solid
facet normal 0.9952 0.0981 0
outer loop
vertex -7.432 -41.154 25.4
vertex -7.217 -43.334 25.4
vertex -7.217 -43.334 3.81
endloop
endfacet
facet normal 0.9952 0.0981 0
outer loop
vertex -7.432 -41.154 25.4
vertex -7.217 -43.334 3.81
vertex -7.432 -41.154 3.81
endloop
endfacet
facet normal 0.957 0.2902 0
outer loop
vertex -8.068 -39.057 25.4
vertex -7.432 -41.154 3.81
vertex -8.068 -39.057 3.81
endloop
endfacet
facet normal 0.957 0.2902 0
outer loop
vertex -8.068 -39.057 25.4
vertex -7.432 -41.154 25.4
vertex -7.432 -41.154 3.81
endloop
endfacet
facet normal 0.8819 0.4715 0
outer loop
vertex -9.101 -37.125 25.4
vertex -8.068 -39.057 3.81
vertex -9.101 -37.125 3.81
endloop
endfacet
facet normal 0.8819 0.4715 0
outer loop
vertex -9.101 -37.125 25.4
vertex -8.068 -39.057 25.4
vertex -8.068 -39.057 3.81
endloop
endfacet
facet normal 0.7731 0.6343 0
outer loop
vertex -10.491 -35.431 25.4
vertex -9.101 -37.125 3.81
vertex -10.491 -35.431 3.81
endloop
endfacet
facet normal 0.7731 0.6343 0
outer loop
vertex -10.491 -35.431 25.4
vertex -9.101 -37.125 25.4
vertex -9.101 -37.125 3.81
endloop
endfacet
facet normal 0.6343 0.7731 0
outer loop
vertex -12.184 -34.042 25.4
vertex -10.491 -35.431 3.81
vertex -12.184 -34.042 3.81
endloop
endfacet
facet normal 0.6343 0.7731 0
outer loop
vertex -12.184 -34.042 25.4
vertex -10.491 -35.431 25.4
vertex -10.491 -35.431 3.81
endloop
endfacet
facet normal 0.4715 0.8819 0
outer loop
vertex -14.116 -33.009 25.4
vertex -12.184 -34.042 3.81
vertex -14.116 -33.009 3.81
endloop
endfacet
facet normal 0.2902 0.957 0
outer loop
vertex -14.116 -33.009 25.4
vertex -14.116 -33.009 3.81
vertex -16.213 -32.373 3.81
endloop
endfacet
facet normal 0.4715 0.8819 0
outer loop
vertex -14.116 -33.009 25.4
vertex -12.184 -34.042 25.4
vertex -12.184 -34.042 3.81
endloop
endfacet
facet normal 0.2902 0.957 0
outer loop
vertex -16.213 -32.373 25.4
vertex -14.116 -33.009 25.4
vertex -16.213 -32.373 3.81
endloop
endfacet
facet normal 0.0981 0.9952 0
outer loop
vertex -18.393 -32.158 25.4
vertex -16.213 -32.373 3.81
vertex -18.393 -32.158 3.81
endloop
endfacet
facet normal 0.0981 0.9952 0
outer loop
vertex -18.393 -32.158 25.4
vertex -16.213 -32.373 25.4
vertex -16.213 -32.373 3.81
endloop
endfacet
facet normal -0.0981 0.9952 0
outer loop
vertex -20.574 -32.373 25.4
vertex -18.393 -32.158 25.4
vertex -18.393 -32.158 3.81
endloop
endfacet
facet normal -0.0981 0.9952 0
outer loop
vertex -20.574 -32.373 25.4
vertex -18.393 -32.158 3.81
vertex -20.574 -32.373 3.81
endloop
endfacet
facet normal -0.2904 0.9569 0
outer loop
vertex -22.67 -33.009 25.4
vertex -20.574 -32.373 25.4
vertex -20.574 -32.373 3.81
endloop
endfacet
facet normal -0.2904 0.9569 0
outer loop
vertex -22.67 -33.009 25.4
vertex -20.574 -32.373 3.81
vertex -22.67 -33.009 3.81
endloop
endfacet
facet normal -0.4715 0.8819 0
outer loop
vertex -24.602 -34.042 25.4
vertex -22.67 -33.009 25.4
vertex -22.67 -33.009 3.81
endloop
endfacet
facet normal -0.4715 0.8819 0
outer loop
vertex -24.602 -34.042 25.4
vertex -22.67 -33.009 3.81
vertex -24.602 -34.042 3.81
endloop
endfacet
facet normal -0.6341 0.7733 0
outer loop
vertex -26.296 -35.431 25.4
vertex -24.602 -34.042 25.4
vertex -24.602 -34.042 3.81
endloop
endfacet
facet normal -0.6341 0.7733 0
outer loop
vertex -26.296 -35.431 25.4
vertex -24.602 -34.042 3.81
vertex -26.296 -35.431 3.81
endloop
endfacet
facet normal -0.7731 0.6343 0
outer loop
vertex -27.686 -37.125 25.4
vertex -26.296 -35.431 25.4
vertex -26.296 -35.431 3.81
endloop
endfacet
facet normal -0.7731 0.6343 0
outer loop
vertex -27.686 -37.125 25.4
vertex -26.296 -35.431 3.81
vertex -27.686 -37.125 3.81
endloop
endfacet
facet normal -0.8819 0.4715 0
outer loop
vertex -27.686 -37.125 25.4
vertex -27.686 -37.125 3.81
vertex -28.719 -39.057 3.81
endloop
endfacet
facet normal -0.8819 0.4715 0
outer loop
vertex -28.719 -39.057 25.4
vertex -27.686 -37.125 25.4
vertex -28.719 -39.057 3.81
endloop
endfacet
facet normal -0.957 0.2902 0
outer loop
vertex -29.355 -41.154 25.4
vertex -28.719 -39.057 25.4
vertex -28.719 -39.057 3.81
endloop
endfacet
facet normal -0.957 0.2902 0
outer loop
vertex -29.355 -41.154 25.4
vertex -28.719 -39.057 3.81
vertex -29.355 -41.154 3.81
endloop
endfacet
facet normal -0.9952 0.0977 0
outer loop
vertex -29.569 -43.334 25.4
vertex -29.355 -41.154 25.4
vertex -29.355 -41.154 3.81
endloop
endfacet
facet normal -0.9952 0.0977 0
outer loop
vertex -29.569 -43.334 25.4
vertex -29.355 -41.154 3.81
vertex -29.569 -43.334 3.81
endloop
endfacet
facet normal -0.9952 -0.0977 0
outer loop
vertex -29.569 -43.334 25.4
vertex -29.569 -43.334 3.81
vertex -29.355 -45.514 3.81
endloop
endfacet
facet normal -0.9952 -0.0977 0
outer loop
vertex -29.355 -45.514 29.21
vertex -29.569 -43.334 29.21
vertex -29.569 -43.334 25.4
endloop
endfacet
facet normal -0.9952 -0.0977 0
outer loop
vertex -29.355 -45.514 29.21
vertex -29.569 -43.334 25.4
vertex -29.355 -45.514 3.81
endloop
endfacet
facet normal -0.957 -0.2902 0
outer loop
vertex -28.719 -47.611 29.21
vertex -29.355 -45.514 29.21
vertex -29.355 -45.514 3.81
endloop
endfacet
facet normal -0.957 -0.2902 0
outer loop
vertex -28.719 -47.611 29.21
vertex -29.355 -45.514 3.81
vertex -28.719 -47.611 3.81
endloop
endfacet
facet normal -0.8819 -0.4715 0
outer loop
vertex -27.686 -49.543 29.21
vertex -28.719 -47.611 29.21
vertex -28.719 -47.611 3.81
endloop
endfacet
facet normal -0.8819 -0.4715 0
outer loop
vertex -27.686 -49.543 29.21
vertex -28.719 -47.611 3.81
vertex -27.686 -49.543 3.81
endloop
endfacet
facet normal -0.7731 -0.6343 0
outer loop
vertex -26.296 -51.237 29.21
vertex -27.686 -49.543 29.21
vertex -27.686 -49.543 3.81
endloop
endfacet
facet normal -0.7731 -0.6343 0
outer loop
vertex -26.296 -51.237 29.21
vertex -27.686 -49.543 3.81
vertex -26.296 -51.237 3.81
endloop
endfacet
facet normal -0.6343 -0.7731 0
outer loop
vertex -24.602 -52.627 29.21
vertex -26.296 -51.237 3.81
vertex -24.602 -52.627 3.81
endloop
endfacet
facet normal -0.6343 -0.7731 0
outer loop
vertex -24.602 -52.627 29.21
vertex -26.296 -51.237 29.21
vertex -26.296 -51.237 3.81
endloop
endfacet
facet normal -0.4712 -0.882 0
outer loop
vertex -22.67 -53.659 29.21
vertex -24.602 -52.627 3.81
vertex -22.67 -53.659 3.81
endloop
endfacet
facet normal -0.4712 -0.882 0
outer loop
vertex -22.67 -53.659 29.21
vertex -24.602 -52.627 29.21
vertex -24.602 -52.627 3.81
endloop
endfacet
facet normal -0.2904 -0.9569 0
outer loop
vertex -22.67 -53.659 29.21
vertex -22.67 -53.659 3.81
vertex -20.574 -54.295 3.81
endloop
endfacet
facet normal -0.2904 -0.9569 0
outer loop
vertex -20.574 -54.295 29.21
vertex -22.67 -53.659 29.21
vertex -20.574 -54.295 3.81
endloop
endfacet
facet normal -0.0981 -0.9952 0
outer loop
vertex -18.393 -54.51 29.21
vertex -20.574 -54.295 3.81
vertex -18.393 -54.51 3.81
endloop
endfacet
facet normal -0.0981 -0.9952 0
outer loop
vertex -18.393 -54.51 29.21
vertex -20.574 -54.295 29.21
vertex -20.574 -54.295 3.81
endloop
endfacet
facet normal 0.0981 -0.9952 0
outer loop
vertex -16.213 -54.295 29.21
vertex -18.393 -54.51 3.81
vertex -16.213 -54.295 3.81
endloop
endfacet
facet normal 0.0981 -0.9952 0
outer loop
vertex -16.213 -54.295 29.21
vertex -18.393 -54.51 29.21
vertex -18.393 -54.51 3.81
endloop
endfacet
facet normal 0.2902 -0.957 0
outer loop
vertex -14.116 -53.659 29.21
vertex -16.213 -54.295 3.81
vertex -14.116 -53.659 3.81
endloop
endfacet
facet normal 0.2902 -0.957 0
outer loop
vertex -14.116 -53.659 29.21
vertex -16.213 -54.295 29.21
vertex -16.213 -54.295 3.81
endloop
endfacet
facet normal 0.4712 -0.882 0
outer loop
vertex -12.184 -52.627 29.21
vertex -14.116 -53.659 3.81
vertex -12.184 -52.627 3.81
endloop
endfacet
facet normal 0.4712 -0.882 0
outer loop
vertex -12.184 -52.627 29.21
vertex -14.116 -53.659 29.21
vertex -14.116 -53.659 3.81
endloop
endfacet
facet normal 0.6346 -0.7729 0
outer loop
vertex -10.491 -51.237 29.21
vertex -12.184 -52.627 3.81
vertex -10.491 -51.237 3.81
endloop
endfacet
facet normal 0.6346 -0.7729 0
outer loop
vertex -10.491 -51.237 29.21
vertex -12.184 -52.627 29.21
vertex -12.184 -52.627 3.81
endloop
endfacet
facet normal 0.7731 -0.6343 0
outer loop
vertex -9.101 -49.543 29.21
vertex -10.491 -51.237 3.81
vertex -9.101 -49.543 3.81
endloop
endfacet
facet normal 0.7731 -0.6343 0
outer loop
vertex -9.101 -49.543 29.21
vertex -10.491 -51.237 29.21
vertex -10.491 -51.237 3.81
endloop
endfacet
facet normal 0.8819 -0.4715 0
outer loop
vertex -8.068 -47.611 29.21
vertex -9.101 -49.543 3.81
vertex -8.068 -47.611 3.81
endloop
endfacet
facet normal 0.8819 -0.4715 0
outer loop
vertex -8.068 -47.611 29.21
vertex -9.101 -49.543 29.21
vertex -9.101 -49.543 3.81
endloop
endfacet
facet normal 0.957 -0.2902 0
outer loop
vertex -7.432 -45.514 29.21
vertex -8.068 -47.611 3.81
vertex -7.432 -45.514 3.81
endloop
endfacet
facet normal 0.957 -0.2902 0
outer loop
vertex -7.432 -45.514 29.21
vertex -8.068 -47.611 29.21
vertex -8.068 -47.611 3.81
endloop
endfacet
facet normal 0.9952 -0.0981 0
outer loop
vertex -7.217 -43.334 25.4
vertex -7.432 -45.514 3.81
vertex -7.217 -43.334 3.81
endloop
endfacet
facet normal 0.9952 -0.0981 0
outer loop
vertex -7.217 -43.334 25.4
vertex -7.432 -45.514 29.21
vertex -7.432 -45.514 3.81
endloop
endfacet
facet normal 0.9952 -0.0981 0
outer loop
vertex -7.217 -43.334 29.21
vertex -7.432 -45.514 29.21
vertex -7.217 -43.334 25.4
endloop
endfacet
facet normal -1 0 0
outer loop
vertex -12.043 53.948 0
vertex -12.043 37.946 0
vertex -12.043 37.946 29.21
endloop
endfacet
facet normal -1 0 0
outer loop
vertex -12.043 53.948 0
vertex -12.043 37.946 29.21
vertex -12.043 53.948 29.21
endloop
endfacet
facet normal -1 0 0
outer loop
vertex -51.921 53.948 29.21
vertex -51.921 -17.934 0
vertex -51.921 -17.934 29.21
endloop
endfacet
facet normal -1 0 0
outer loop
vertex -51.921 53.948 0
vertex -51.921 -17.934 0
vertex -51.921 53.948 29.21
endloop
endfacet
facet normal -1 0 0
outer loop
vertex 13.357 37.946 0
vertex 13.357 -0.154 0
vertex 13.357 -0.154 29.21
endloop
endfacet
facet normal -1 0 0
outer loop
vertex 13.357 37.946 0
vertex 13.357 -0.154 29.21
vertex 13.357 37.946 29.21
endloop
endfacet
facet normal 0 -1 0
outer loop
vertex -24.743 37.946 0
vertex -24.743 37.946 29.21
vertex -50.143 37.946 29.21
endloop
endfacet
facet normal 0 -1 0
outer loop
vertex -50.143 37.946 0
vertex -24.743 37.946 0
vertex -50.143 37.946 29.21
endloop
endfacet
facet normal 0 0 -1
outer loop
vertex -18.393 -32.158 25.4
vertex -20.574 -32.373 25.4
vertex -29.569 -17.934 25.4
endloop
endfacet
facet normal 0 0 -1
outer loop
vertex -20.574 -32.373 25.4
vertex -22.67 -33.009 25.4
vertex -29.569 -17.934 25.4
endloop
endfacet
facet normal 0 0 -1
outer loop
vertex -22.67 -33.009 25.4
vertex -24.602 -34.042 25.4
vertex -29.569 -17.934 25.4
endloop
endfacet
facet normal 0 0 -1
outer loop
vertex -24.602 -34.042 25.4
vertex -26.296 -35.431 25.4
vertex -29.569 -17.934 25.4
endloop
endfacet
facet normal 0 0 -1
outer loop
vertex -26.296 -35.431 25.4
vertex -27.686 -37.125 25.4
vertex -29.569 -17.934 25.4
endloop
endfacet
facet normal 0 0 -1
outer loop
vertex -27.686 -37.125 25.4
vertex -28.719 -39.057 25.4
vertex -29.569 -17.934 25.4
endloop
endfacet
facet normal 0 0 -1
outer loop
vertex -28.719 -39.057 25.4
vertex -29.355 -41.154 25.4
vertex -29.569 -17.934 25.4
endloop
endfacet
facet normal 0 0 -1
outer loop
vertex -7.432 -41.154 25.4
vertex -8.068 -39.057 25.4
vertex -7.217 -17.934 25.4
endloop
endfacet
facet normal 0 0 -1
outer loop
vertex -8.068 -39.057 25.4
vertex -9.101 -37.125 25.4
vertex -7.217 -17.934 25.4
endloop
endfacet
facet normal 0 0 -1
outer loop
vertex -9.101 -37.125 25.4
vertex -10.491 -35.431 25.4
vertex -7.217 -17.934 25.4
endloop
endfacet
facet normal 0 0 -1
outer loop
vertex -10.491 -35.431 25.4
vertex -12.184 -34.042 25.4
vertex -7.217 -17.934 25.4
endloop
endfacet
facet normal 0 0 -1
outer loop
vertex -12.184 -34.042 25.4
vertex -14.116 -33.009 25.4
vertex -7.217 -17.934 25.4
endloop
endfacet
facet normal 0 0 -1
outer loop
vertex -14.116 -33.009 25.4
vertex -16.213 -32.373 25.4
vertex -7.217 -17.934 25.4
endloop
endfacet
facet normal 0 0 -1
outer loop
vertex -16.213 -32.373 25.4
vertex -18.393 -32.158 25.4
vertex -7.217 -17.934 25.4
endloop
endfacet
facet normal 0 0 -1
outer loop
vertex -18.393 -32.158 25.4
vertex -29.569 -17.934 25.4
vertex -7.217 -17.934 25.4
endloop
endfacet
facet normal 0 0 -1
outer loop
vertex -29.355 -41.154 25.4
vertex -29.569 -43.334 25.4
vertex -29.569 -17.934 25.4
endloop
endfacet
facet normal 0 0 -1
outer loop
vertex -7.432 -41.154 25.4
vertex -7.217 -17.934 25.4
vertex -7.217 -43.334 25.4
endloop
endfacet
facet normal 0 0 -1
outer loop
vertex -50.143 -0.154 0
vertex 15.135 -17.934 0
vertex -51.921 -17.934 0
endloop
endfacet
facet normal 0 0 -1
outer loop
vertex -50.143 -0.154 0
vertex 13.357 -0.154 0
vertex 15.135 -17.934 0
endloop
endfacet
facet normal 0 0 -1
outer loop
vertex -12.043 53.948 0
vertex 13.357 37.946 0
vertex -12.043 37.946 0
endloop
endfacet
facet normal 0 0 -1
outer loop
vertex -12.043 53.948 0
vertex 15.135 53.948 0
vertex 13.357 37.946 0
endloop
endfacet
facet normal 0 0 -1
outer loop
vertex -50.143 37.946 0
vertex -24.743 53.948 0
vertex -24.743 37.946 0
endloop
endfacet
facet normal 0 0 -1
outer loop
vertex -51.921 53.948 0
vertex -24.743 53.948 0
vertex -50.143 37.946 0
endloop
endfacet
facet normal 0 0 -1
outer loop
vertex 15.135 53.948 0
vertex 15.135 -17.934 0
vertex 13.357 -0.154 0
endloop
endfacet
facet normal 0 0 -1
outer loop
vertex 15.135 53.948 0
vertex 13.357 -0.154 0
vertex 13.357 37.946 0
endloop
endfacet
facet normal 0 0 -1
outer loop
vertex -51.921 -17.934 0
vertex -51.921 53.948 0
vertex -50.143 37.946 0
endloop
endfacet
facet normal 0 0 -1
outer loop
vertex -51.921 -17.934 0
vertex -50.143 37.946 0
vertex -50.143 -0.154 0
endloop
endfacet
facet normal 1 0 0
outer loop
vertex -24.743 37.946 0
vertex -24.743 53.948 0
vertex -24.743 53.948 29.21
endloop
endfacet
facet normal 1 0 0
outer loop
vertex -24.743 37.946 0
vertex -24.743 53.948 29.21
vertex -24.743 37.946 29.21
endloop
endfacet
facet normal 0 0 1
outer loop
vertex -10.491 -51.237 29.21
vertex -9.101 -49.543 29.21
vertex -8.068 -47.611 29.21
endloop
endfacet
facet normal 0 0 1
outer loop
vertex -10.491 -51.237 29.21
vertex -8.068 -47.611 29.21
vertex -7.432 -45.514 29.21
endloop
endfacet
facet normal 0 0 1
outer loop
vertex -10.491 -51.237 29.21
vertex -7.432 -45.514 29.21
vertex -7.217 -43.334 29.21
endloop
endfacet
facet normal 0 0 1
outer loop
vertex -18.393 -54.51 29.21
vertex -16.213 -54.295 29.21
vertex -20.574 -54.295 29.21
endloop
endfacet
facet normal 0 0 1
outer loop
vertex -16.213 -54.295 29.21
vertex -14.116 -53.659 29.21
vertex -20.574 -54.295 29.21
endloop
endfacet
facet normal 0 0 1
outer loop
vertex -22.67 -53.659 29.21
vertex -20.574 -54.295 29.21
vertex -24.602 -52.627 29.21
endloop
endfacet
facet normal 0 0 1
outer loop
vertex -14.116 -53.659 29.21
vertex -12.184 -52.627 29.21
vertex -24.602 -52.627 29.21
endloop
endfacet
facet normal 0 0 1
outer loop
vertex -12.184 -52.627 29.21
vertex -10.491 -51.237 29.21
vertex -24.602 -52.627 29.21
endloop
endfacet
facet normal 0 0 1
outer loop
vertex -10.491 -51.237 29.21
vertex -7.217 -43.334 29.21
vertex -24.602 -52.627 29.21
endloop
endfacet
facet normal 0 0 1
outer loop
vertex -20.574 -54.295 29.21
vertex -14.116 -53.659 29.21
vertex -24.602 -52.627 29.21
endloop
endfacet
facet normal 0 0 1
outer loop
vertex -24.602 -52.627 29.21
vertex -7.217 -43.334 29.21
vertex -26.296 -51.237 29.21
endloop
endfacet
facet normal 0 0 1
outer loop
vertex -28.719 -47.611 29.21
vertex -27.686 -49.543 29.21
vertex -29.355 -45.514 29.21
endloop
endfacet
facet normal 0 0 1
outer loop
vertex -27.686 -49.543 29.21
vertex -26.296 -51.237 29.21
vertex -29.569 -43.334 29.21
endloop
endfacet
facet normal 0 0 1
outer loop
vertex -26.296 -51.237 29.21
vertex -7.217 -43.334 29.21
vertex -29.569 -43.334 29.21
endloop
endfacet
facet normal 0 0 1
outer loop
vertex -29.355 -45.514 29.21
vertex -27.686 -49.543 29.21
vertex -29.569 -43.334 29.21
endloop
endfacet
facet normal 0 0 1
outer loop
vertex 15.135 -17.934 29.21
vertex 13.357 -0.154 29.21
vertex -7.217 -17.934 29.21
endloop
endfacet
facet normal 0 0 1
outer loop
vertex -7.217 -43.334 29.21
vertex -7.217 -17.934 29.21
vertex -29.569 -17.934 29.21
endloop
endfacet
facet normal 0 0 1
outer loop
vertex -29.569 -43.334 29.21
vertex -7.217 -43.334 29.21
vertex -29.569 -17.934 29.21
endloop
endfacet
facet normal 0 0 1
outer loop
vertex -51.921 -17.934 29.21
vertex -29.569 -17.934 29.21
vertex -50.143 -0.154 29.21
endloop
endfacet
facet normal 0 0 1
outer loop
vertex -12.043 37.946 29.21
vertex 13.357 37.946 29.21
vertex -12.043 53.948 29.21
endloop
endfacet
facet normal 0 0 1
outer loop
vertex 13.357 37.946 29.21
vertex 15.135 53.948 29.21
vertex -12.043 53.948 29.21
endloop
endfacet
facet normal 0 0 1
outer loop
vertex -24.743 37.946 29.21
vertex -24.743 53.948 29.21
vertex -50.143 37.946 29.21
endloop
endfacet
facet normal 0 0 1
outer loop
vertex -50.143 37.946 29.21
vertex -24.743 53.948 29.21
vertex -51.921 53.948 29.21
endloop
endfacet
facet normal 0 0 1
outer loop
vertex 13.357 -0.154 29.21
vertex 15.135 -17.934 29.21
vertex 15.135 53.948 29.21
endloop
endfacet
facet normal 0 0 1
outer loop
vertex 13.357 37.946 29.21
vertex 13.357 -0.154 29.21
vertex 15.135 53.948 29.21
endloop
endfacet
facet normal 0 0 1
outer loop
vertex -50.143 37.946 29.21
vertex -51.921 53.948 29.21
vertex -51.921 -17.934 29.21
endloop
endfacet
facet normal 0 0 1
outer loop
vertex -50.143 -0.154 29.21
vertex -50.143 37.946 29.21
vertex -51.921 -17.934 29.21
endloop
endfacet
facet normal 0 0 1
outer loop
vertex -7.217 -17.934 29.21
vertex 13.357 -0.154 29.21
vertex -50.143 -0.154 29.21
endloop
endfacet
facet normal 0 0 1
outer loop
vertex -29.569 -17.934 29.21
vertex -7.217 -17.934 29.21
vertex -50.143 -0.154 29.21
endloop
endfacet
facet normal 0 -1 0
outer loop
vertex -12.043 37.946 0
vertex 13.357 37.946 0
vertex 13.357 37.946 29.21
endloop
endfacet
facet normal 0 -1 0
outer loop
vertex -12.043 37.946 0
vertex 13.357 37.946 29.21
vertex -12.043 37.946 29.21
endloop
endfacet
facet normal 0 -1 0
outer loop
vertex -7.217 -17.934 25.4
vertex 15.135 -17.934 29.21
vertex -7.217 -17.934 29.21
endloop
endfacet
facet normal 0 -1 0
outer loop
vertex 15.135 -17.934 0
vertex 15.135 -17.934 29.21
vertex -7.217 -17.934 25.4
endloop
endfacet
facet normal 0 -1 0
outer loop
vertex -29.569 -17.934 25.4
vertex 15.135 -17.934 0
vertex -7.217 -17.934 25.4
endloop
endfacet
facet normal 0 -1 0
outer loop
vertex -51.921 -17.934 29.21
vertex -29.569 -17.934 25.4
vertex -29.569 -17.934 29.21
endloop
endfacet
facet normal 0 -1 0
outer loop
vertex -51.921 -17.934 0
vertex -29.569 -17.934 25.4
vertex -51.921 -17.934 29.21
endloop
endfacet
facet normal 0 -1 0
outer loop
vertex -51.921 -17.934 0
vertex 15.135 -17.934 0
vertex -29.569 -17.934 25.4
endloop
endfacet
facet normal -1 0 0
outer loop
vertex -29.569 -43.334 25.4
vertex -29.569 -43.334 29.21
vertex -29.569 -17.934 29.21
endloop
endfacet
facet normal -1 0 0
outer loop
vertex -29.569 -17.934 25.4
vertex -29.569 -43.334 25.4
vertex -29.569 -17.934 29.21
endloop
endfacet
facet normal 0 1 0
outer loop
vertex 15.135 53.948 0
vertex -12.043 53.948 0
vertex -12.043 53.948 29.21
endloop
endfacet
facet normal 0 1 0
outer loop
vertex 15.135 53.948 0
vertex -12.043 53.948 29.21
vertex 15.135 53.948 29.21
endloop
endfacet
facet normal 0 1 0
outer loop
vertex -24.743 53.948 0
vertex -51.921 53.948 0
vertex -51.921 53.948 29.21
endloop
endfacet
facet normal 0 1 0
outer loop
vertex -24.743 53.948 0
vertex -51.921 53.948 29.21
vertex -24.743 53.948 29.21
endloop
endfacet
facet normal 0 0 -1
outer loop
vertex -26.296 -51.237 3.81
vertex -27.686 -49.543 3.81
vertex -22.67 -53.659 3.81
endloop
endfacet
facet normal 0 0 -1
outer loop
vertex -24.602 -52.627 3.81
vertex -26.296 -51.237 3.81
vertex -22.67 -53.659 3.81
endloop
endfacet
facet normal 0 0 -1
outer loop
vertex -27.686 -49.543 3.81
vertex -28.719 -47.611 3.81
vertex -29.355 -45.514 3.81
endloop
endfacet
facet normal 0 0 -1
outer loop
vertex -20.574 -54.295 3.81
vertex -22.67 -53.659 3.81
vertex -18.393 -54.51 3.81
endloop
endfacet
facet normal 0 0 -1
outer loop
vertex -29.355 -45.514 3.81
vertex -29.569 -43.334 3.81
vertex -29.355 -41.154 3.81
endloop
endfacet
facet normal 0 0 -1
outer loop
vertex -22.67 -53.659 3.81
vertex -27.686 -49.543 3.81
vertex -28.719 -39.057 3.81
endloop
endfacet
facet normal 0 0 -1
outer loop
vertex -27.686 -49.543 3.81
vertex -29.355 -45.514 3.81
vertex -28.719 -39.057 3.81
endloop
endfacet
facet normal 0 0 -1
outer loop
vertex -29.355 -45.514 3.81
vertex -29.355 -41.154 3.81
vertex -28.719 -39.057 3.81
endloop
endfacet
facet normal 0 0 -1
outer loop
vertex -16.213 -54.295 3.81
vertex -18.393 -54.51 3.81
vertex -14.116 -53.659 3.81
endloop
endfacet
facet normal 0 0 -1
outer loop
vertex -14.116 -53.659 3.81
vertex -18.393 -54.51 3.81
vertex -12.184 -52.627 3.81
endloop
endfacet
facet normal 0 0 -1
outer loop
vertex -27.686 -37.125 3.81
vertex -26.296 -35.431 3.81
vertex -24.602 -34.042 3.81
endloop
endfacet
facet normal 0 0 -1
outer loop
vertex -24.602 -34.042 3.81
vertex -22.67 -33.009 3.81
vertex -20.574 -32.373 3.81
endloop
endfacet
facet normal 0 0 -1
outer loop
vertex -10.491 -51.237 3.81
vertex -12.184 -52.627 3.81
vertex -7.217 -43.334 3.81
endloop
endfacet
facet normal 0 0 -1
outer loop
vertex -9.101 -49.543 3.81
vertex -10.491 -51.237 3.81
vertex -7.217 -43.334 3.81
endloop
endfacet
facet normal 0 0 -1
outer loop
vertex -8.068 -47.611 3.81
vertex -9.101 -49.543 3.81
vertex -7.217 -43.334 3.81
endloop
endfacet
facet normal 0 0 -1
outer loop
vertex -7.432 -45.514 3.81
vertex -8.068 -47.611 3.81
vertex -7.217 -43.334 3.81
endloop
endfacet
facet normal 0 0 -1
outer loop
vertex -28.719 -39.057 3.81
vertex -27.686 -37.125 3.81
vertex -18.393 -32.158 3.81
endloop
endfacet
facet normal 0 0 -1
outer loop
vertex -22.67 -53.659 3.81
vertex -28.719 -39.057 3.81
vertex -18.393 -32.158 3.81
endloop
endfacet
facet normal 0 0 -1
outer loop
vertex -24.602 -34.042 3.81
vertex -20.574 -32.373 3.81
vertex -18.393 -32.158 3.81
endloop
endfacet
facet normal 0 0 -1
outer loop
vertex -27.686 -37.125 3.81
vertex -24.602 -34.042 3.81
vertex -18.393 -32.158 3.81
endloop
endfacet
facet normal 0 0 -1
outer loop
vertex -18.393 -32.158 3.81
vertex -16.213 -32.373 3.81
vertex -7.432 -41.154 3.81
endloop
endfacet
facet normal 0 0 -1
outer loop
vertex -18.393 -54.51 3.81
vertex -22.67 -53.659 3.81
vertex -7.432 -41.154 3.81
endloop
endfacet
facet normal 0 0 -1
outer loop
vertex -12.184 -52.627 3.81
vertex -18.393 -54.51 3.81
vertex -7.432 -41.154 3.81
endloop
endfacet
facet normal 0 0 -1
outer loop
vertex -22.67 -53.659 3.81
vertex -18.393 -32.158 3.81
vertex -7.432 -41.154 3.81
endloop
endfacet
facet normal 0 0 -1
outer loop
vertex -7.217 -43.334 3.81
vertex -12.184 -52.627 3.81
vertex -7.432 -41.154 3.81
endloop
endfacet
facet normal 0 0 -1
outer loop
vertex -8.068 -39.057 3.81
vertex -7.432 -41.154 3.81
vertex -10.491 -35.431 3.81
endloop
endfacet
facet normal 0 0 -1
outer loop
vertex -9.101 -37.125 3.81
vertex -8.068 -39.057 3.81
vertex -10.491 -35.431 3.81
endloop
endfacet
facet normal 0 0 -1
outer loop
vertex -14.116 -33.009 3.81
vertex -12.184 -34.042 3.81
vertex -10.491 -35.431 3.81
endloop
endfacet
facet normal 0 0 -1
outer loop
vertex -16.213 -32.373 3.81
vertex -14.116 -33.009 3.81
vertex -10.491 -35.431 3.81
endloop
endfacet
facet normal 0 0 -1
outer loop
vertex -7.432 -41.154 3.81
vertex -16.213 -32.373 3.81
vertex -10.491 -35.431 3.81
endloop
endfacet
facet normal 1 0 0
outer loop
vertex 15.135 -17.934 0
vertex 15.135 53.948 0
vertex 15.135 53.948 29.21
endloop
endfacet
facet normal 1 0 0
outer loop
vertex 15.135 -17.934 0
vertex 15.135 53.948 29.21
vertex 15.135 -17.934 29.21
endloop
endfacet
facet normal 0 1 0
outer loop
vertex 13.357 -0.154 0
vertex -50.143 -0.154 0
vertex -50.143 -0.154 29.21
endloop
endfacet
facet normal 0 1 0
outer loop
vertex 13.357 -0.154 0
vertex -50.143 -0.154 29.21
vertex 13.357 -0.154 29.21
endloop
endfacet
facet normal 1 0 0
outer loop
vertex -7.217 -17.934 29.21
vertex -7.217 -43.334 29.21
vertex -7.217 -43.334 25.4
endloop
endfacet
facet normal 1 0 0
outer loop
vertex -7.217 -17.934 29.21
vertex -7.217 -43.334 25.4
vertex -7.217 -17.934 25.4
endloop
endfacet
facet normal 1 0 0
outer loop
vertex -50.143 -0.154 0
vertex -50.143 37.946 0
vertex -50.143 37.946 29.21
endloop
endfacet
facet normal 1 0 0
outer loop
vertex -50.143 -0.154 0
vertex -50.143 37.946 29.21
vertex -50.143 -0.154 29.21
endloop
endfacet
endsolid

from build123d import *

# Parameters (mm, degrees)
BOSS_EXTRUDE2_DEPTH = 29.21
SKETCH2_W           = 22.352
SKETCH2_H           = 25.4
BOSS_EXTRUDE3_DEPTH = 3.81
SKETCH5_R           = 11.176
BOSS_EXTRUDE6_DEPTH = 25.4


with BuildPart() as part:
    # Sketch1 → Boss-Extrude2 (new body)
    with BuildSketch(Plane.XY):
        Polygon((-12.043317073, 53.947940362), (15.134682927, 53.947940362), (15.134682927, -17.934059638), (-51.921317073, -17.934059638), (-51.921317073, 53.947940362), (-24.743317073, 53.947940362), (-24.743317073, 37.945940362), (-50.143317073, 37.945940362), (-50.143317073, -0.154059638), (13.356682927, -0.154059638), (13.356682927, 37.945940362), (-12.043317073, 37.945940362), align=None)
    extrude(amount=BOSS_EXTRUDE2_DEPTH)

    # Sketch2 → Boss-Extrude3 (add)
    with BuildSketch(Plane.XY.offset(29.21)):
        with Locations((-18.393317073, -30.634059638)):
            Rectangle(SKETCH2_W, SKETCH2_H)
    extrude(amount=-BOSS_EXTRUDE3_DEPTH)

    # Sketch5 → Boss-Extrude6 (add)
    with BuildSketch(Plane.XY.offset(29.21)):
        with Locations((-18.393317073, -43.334059638)):
            Circle(SKETCH5_R)
    extrude(amount=-BOSS_EXTRUDE6_DEPTH)


solid = part.part
